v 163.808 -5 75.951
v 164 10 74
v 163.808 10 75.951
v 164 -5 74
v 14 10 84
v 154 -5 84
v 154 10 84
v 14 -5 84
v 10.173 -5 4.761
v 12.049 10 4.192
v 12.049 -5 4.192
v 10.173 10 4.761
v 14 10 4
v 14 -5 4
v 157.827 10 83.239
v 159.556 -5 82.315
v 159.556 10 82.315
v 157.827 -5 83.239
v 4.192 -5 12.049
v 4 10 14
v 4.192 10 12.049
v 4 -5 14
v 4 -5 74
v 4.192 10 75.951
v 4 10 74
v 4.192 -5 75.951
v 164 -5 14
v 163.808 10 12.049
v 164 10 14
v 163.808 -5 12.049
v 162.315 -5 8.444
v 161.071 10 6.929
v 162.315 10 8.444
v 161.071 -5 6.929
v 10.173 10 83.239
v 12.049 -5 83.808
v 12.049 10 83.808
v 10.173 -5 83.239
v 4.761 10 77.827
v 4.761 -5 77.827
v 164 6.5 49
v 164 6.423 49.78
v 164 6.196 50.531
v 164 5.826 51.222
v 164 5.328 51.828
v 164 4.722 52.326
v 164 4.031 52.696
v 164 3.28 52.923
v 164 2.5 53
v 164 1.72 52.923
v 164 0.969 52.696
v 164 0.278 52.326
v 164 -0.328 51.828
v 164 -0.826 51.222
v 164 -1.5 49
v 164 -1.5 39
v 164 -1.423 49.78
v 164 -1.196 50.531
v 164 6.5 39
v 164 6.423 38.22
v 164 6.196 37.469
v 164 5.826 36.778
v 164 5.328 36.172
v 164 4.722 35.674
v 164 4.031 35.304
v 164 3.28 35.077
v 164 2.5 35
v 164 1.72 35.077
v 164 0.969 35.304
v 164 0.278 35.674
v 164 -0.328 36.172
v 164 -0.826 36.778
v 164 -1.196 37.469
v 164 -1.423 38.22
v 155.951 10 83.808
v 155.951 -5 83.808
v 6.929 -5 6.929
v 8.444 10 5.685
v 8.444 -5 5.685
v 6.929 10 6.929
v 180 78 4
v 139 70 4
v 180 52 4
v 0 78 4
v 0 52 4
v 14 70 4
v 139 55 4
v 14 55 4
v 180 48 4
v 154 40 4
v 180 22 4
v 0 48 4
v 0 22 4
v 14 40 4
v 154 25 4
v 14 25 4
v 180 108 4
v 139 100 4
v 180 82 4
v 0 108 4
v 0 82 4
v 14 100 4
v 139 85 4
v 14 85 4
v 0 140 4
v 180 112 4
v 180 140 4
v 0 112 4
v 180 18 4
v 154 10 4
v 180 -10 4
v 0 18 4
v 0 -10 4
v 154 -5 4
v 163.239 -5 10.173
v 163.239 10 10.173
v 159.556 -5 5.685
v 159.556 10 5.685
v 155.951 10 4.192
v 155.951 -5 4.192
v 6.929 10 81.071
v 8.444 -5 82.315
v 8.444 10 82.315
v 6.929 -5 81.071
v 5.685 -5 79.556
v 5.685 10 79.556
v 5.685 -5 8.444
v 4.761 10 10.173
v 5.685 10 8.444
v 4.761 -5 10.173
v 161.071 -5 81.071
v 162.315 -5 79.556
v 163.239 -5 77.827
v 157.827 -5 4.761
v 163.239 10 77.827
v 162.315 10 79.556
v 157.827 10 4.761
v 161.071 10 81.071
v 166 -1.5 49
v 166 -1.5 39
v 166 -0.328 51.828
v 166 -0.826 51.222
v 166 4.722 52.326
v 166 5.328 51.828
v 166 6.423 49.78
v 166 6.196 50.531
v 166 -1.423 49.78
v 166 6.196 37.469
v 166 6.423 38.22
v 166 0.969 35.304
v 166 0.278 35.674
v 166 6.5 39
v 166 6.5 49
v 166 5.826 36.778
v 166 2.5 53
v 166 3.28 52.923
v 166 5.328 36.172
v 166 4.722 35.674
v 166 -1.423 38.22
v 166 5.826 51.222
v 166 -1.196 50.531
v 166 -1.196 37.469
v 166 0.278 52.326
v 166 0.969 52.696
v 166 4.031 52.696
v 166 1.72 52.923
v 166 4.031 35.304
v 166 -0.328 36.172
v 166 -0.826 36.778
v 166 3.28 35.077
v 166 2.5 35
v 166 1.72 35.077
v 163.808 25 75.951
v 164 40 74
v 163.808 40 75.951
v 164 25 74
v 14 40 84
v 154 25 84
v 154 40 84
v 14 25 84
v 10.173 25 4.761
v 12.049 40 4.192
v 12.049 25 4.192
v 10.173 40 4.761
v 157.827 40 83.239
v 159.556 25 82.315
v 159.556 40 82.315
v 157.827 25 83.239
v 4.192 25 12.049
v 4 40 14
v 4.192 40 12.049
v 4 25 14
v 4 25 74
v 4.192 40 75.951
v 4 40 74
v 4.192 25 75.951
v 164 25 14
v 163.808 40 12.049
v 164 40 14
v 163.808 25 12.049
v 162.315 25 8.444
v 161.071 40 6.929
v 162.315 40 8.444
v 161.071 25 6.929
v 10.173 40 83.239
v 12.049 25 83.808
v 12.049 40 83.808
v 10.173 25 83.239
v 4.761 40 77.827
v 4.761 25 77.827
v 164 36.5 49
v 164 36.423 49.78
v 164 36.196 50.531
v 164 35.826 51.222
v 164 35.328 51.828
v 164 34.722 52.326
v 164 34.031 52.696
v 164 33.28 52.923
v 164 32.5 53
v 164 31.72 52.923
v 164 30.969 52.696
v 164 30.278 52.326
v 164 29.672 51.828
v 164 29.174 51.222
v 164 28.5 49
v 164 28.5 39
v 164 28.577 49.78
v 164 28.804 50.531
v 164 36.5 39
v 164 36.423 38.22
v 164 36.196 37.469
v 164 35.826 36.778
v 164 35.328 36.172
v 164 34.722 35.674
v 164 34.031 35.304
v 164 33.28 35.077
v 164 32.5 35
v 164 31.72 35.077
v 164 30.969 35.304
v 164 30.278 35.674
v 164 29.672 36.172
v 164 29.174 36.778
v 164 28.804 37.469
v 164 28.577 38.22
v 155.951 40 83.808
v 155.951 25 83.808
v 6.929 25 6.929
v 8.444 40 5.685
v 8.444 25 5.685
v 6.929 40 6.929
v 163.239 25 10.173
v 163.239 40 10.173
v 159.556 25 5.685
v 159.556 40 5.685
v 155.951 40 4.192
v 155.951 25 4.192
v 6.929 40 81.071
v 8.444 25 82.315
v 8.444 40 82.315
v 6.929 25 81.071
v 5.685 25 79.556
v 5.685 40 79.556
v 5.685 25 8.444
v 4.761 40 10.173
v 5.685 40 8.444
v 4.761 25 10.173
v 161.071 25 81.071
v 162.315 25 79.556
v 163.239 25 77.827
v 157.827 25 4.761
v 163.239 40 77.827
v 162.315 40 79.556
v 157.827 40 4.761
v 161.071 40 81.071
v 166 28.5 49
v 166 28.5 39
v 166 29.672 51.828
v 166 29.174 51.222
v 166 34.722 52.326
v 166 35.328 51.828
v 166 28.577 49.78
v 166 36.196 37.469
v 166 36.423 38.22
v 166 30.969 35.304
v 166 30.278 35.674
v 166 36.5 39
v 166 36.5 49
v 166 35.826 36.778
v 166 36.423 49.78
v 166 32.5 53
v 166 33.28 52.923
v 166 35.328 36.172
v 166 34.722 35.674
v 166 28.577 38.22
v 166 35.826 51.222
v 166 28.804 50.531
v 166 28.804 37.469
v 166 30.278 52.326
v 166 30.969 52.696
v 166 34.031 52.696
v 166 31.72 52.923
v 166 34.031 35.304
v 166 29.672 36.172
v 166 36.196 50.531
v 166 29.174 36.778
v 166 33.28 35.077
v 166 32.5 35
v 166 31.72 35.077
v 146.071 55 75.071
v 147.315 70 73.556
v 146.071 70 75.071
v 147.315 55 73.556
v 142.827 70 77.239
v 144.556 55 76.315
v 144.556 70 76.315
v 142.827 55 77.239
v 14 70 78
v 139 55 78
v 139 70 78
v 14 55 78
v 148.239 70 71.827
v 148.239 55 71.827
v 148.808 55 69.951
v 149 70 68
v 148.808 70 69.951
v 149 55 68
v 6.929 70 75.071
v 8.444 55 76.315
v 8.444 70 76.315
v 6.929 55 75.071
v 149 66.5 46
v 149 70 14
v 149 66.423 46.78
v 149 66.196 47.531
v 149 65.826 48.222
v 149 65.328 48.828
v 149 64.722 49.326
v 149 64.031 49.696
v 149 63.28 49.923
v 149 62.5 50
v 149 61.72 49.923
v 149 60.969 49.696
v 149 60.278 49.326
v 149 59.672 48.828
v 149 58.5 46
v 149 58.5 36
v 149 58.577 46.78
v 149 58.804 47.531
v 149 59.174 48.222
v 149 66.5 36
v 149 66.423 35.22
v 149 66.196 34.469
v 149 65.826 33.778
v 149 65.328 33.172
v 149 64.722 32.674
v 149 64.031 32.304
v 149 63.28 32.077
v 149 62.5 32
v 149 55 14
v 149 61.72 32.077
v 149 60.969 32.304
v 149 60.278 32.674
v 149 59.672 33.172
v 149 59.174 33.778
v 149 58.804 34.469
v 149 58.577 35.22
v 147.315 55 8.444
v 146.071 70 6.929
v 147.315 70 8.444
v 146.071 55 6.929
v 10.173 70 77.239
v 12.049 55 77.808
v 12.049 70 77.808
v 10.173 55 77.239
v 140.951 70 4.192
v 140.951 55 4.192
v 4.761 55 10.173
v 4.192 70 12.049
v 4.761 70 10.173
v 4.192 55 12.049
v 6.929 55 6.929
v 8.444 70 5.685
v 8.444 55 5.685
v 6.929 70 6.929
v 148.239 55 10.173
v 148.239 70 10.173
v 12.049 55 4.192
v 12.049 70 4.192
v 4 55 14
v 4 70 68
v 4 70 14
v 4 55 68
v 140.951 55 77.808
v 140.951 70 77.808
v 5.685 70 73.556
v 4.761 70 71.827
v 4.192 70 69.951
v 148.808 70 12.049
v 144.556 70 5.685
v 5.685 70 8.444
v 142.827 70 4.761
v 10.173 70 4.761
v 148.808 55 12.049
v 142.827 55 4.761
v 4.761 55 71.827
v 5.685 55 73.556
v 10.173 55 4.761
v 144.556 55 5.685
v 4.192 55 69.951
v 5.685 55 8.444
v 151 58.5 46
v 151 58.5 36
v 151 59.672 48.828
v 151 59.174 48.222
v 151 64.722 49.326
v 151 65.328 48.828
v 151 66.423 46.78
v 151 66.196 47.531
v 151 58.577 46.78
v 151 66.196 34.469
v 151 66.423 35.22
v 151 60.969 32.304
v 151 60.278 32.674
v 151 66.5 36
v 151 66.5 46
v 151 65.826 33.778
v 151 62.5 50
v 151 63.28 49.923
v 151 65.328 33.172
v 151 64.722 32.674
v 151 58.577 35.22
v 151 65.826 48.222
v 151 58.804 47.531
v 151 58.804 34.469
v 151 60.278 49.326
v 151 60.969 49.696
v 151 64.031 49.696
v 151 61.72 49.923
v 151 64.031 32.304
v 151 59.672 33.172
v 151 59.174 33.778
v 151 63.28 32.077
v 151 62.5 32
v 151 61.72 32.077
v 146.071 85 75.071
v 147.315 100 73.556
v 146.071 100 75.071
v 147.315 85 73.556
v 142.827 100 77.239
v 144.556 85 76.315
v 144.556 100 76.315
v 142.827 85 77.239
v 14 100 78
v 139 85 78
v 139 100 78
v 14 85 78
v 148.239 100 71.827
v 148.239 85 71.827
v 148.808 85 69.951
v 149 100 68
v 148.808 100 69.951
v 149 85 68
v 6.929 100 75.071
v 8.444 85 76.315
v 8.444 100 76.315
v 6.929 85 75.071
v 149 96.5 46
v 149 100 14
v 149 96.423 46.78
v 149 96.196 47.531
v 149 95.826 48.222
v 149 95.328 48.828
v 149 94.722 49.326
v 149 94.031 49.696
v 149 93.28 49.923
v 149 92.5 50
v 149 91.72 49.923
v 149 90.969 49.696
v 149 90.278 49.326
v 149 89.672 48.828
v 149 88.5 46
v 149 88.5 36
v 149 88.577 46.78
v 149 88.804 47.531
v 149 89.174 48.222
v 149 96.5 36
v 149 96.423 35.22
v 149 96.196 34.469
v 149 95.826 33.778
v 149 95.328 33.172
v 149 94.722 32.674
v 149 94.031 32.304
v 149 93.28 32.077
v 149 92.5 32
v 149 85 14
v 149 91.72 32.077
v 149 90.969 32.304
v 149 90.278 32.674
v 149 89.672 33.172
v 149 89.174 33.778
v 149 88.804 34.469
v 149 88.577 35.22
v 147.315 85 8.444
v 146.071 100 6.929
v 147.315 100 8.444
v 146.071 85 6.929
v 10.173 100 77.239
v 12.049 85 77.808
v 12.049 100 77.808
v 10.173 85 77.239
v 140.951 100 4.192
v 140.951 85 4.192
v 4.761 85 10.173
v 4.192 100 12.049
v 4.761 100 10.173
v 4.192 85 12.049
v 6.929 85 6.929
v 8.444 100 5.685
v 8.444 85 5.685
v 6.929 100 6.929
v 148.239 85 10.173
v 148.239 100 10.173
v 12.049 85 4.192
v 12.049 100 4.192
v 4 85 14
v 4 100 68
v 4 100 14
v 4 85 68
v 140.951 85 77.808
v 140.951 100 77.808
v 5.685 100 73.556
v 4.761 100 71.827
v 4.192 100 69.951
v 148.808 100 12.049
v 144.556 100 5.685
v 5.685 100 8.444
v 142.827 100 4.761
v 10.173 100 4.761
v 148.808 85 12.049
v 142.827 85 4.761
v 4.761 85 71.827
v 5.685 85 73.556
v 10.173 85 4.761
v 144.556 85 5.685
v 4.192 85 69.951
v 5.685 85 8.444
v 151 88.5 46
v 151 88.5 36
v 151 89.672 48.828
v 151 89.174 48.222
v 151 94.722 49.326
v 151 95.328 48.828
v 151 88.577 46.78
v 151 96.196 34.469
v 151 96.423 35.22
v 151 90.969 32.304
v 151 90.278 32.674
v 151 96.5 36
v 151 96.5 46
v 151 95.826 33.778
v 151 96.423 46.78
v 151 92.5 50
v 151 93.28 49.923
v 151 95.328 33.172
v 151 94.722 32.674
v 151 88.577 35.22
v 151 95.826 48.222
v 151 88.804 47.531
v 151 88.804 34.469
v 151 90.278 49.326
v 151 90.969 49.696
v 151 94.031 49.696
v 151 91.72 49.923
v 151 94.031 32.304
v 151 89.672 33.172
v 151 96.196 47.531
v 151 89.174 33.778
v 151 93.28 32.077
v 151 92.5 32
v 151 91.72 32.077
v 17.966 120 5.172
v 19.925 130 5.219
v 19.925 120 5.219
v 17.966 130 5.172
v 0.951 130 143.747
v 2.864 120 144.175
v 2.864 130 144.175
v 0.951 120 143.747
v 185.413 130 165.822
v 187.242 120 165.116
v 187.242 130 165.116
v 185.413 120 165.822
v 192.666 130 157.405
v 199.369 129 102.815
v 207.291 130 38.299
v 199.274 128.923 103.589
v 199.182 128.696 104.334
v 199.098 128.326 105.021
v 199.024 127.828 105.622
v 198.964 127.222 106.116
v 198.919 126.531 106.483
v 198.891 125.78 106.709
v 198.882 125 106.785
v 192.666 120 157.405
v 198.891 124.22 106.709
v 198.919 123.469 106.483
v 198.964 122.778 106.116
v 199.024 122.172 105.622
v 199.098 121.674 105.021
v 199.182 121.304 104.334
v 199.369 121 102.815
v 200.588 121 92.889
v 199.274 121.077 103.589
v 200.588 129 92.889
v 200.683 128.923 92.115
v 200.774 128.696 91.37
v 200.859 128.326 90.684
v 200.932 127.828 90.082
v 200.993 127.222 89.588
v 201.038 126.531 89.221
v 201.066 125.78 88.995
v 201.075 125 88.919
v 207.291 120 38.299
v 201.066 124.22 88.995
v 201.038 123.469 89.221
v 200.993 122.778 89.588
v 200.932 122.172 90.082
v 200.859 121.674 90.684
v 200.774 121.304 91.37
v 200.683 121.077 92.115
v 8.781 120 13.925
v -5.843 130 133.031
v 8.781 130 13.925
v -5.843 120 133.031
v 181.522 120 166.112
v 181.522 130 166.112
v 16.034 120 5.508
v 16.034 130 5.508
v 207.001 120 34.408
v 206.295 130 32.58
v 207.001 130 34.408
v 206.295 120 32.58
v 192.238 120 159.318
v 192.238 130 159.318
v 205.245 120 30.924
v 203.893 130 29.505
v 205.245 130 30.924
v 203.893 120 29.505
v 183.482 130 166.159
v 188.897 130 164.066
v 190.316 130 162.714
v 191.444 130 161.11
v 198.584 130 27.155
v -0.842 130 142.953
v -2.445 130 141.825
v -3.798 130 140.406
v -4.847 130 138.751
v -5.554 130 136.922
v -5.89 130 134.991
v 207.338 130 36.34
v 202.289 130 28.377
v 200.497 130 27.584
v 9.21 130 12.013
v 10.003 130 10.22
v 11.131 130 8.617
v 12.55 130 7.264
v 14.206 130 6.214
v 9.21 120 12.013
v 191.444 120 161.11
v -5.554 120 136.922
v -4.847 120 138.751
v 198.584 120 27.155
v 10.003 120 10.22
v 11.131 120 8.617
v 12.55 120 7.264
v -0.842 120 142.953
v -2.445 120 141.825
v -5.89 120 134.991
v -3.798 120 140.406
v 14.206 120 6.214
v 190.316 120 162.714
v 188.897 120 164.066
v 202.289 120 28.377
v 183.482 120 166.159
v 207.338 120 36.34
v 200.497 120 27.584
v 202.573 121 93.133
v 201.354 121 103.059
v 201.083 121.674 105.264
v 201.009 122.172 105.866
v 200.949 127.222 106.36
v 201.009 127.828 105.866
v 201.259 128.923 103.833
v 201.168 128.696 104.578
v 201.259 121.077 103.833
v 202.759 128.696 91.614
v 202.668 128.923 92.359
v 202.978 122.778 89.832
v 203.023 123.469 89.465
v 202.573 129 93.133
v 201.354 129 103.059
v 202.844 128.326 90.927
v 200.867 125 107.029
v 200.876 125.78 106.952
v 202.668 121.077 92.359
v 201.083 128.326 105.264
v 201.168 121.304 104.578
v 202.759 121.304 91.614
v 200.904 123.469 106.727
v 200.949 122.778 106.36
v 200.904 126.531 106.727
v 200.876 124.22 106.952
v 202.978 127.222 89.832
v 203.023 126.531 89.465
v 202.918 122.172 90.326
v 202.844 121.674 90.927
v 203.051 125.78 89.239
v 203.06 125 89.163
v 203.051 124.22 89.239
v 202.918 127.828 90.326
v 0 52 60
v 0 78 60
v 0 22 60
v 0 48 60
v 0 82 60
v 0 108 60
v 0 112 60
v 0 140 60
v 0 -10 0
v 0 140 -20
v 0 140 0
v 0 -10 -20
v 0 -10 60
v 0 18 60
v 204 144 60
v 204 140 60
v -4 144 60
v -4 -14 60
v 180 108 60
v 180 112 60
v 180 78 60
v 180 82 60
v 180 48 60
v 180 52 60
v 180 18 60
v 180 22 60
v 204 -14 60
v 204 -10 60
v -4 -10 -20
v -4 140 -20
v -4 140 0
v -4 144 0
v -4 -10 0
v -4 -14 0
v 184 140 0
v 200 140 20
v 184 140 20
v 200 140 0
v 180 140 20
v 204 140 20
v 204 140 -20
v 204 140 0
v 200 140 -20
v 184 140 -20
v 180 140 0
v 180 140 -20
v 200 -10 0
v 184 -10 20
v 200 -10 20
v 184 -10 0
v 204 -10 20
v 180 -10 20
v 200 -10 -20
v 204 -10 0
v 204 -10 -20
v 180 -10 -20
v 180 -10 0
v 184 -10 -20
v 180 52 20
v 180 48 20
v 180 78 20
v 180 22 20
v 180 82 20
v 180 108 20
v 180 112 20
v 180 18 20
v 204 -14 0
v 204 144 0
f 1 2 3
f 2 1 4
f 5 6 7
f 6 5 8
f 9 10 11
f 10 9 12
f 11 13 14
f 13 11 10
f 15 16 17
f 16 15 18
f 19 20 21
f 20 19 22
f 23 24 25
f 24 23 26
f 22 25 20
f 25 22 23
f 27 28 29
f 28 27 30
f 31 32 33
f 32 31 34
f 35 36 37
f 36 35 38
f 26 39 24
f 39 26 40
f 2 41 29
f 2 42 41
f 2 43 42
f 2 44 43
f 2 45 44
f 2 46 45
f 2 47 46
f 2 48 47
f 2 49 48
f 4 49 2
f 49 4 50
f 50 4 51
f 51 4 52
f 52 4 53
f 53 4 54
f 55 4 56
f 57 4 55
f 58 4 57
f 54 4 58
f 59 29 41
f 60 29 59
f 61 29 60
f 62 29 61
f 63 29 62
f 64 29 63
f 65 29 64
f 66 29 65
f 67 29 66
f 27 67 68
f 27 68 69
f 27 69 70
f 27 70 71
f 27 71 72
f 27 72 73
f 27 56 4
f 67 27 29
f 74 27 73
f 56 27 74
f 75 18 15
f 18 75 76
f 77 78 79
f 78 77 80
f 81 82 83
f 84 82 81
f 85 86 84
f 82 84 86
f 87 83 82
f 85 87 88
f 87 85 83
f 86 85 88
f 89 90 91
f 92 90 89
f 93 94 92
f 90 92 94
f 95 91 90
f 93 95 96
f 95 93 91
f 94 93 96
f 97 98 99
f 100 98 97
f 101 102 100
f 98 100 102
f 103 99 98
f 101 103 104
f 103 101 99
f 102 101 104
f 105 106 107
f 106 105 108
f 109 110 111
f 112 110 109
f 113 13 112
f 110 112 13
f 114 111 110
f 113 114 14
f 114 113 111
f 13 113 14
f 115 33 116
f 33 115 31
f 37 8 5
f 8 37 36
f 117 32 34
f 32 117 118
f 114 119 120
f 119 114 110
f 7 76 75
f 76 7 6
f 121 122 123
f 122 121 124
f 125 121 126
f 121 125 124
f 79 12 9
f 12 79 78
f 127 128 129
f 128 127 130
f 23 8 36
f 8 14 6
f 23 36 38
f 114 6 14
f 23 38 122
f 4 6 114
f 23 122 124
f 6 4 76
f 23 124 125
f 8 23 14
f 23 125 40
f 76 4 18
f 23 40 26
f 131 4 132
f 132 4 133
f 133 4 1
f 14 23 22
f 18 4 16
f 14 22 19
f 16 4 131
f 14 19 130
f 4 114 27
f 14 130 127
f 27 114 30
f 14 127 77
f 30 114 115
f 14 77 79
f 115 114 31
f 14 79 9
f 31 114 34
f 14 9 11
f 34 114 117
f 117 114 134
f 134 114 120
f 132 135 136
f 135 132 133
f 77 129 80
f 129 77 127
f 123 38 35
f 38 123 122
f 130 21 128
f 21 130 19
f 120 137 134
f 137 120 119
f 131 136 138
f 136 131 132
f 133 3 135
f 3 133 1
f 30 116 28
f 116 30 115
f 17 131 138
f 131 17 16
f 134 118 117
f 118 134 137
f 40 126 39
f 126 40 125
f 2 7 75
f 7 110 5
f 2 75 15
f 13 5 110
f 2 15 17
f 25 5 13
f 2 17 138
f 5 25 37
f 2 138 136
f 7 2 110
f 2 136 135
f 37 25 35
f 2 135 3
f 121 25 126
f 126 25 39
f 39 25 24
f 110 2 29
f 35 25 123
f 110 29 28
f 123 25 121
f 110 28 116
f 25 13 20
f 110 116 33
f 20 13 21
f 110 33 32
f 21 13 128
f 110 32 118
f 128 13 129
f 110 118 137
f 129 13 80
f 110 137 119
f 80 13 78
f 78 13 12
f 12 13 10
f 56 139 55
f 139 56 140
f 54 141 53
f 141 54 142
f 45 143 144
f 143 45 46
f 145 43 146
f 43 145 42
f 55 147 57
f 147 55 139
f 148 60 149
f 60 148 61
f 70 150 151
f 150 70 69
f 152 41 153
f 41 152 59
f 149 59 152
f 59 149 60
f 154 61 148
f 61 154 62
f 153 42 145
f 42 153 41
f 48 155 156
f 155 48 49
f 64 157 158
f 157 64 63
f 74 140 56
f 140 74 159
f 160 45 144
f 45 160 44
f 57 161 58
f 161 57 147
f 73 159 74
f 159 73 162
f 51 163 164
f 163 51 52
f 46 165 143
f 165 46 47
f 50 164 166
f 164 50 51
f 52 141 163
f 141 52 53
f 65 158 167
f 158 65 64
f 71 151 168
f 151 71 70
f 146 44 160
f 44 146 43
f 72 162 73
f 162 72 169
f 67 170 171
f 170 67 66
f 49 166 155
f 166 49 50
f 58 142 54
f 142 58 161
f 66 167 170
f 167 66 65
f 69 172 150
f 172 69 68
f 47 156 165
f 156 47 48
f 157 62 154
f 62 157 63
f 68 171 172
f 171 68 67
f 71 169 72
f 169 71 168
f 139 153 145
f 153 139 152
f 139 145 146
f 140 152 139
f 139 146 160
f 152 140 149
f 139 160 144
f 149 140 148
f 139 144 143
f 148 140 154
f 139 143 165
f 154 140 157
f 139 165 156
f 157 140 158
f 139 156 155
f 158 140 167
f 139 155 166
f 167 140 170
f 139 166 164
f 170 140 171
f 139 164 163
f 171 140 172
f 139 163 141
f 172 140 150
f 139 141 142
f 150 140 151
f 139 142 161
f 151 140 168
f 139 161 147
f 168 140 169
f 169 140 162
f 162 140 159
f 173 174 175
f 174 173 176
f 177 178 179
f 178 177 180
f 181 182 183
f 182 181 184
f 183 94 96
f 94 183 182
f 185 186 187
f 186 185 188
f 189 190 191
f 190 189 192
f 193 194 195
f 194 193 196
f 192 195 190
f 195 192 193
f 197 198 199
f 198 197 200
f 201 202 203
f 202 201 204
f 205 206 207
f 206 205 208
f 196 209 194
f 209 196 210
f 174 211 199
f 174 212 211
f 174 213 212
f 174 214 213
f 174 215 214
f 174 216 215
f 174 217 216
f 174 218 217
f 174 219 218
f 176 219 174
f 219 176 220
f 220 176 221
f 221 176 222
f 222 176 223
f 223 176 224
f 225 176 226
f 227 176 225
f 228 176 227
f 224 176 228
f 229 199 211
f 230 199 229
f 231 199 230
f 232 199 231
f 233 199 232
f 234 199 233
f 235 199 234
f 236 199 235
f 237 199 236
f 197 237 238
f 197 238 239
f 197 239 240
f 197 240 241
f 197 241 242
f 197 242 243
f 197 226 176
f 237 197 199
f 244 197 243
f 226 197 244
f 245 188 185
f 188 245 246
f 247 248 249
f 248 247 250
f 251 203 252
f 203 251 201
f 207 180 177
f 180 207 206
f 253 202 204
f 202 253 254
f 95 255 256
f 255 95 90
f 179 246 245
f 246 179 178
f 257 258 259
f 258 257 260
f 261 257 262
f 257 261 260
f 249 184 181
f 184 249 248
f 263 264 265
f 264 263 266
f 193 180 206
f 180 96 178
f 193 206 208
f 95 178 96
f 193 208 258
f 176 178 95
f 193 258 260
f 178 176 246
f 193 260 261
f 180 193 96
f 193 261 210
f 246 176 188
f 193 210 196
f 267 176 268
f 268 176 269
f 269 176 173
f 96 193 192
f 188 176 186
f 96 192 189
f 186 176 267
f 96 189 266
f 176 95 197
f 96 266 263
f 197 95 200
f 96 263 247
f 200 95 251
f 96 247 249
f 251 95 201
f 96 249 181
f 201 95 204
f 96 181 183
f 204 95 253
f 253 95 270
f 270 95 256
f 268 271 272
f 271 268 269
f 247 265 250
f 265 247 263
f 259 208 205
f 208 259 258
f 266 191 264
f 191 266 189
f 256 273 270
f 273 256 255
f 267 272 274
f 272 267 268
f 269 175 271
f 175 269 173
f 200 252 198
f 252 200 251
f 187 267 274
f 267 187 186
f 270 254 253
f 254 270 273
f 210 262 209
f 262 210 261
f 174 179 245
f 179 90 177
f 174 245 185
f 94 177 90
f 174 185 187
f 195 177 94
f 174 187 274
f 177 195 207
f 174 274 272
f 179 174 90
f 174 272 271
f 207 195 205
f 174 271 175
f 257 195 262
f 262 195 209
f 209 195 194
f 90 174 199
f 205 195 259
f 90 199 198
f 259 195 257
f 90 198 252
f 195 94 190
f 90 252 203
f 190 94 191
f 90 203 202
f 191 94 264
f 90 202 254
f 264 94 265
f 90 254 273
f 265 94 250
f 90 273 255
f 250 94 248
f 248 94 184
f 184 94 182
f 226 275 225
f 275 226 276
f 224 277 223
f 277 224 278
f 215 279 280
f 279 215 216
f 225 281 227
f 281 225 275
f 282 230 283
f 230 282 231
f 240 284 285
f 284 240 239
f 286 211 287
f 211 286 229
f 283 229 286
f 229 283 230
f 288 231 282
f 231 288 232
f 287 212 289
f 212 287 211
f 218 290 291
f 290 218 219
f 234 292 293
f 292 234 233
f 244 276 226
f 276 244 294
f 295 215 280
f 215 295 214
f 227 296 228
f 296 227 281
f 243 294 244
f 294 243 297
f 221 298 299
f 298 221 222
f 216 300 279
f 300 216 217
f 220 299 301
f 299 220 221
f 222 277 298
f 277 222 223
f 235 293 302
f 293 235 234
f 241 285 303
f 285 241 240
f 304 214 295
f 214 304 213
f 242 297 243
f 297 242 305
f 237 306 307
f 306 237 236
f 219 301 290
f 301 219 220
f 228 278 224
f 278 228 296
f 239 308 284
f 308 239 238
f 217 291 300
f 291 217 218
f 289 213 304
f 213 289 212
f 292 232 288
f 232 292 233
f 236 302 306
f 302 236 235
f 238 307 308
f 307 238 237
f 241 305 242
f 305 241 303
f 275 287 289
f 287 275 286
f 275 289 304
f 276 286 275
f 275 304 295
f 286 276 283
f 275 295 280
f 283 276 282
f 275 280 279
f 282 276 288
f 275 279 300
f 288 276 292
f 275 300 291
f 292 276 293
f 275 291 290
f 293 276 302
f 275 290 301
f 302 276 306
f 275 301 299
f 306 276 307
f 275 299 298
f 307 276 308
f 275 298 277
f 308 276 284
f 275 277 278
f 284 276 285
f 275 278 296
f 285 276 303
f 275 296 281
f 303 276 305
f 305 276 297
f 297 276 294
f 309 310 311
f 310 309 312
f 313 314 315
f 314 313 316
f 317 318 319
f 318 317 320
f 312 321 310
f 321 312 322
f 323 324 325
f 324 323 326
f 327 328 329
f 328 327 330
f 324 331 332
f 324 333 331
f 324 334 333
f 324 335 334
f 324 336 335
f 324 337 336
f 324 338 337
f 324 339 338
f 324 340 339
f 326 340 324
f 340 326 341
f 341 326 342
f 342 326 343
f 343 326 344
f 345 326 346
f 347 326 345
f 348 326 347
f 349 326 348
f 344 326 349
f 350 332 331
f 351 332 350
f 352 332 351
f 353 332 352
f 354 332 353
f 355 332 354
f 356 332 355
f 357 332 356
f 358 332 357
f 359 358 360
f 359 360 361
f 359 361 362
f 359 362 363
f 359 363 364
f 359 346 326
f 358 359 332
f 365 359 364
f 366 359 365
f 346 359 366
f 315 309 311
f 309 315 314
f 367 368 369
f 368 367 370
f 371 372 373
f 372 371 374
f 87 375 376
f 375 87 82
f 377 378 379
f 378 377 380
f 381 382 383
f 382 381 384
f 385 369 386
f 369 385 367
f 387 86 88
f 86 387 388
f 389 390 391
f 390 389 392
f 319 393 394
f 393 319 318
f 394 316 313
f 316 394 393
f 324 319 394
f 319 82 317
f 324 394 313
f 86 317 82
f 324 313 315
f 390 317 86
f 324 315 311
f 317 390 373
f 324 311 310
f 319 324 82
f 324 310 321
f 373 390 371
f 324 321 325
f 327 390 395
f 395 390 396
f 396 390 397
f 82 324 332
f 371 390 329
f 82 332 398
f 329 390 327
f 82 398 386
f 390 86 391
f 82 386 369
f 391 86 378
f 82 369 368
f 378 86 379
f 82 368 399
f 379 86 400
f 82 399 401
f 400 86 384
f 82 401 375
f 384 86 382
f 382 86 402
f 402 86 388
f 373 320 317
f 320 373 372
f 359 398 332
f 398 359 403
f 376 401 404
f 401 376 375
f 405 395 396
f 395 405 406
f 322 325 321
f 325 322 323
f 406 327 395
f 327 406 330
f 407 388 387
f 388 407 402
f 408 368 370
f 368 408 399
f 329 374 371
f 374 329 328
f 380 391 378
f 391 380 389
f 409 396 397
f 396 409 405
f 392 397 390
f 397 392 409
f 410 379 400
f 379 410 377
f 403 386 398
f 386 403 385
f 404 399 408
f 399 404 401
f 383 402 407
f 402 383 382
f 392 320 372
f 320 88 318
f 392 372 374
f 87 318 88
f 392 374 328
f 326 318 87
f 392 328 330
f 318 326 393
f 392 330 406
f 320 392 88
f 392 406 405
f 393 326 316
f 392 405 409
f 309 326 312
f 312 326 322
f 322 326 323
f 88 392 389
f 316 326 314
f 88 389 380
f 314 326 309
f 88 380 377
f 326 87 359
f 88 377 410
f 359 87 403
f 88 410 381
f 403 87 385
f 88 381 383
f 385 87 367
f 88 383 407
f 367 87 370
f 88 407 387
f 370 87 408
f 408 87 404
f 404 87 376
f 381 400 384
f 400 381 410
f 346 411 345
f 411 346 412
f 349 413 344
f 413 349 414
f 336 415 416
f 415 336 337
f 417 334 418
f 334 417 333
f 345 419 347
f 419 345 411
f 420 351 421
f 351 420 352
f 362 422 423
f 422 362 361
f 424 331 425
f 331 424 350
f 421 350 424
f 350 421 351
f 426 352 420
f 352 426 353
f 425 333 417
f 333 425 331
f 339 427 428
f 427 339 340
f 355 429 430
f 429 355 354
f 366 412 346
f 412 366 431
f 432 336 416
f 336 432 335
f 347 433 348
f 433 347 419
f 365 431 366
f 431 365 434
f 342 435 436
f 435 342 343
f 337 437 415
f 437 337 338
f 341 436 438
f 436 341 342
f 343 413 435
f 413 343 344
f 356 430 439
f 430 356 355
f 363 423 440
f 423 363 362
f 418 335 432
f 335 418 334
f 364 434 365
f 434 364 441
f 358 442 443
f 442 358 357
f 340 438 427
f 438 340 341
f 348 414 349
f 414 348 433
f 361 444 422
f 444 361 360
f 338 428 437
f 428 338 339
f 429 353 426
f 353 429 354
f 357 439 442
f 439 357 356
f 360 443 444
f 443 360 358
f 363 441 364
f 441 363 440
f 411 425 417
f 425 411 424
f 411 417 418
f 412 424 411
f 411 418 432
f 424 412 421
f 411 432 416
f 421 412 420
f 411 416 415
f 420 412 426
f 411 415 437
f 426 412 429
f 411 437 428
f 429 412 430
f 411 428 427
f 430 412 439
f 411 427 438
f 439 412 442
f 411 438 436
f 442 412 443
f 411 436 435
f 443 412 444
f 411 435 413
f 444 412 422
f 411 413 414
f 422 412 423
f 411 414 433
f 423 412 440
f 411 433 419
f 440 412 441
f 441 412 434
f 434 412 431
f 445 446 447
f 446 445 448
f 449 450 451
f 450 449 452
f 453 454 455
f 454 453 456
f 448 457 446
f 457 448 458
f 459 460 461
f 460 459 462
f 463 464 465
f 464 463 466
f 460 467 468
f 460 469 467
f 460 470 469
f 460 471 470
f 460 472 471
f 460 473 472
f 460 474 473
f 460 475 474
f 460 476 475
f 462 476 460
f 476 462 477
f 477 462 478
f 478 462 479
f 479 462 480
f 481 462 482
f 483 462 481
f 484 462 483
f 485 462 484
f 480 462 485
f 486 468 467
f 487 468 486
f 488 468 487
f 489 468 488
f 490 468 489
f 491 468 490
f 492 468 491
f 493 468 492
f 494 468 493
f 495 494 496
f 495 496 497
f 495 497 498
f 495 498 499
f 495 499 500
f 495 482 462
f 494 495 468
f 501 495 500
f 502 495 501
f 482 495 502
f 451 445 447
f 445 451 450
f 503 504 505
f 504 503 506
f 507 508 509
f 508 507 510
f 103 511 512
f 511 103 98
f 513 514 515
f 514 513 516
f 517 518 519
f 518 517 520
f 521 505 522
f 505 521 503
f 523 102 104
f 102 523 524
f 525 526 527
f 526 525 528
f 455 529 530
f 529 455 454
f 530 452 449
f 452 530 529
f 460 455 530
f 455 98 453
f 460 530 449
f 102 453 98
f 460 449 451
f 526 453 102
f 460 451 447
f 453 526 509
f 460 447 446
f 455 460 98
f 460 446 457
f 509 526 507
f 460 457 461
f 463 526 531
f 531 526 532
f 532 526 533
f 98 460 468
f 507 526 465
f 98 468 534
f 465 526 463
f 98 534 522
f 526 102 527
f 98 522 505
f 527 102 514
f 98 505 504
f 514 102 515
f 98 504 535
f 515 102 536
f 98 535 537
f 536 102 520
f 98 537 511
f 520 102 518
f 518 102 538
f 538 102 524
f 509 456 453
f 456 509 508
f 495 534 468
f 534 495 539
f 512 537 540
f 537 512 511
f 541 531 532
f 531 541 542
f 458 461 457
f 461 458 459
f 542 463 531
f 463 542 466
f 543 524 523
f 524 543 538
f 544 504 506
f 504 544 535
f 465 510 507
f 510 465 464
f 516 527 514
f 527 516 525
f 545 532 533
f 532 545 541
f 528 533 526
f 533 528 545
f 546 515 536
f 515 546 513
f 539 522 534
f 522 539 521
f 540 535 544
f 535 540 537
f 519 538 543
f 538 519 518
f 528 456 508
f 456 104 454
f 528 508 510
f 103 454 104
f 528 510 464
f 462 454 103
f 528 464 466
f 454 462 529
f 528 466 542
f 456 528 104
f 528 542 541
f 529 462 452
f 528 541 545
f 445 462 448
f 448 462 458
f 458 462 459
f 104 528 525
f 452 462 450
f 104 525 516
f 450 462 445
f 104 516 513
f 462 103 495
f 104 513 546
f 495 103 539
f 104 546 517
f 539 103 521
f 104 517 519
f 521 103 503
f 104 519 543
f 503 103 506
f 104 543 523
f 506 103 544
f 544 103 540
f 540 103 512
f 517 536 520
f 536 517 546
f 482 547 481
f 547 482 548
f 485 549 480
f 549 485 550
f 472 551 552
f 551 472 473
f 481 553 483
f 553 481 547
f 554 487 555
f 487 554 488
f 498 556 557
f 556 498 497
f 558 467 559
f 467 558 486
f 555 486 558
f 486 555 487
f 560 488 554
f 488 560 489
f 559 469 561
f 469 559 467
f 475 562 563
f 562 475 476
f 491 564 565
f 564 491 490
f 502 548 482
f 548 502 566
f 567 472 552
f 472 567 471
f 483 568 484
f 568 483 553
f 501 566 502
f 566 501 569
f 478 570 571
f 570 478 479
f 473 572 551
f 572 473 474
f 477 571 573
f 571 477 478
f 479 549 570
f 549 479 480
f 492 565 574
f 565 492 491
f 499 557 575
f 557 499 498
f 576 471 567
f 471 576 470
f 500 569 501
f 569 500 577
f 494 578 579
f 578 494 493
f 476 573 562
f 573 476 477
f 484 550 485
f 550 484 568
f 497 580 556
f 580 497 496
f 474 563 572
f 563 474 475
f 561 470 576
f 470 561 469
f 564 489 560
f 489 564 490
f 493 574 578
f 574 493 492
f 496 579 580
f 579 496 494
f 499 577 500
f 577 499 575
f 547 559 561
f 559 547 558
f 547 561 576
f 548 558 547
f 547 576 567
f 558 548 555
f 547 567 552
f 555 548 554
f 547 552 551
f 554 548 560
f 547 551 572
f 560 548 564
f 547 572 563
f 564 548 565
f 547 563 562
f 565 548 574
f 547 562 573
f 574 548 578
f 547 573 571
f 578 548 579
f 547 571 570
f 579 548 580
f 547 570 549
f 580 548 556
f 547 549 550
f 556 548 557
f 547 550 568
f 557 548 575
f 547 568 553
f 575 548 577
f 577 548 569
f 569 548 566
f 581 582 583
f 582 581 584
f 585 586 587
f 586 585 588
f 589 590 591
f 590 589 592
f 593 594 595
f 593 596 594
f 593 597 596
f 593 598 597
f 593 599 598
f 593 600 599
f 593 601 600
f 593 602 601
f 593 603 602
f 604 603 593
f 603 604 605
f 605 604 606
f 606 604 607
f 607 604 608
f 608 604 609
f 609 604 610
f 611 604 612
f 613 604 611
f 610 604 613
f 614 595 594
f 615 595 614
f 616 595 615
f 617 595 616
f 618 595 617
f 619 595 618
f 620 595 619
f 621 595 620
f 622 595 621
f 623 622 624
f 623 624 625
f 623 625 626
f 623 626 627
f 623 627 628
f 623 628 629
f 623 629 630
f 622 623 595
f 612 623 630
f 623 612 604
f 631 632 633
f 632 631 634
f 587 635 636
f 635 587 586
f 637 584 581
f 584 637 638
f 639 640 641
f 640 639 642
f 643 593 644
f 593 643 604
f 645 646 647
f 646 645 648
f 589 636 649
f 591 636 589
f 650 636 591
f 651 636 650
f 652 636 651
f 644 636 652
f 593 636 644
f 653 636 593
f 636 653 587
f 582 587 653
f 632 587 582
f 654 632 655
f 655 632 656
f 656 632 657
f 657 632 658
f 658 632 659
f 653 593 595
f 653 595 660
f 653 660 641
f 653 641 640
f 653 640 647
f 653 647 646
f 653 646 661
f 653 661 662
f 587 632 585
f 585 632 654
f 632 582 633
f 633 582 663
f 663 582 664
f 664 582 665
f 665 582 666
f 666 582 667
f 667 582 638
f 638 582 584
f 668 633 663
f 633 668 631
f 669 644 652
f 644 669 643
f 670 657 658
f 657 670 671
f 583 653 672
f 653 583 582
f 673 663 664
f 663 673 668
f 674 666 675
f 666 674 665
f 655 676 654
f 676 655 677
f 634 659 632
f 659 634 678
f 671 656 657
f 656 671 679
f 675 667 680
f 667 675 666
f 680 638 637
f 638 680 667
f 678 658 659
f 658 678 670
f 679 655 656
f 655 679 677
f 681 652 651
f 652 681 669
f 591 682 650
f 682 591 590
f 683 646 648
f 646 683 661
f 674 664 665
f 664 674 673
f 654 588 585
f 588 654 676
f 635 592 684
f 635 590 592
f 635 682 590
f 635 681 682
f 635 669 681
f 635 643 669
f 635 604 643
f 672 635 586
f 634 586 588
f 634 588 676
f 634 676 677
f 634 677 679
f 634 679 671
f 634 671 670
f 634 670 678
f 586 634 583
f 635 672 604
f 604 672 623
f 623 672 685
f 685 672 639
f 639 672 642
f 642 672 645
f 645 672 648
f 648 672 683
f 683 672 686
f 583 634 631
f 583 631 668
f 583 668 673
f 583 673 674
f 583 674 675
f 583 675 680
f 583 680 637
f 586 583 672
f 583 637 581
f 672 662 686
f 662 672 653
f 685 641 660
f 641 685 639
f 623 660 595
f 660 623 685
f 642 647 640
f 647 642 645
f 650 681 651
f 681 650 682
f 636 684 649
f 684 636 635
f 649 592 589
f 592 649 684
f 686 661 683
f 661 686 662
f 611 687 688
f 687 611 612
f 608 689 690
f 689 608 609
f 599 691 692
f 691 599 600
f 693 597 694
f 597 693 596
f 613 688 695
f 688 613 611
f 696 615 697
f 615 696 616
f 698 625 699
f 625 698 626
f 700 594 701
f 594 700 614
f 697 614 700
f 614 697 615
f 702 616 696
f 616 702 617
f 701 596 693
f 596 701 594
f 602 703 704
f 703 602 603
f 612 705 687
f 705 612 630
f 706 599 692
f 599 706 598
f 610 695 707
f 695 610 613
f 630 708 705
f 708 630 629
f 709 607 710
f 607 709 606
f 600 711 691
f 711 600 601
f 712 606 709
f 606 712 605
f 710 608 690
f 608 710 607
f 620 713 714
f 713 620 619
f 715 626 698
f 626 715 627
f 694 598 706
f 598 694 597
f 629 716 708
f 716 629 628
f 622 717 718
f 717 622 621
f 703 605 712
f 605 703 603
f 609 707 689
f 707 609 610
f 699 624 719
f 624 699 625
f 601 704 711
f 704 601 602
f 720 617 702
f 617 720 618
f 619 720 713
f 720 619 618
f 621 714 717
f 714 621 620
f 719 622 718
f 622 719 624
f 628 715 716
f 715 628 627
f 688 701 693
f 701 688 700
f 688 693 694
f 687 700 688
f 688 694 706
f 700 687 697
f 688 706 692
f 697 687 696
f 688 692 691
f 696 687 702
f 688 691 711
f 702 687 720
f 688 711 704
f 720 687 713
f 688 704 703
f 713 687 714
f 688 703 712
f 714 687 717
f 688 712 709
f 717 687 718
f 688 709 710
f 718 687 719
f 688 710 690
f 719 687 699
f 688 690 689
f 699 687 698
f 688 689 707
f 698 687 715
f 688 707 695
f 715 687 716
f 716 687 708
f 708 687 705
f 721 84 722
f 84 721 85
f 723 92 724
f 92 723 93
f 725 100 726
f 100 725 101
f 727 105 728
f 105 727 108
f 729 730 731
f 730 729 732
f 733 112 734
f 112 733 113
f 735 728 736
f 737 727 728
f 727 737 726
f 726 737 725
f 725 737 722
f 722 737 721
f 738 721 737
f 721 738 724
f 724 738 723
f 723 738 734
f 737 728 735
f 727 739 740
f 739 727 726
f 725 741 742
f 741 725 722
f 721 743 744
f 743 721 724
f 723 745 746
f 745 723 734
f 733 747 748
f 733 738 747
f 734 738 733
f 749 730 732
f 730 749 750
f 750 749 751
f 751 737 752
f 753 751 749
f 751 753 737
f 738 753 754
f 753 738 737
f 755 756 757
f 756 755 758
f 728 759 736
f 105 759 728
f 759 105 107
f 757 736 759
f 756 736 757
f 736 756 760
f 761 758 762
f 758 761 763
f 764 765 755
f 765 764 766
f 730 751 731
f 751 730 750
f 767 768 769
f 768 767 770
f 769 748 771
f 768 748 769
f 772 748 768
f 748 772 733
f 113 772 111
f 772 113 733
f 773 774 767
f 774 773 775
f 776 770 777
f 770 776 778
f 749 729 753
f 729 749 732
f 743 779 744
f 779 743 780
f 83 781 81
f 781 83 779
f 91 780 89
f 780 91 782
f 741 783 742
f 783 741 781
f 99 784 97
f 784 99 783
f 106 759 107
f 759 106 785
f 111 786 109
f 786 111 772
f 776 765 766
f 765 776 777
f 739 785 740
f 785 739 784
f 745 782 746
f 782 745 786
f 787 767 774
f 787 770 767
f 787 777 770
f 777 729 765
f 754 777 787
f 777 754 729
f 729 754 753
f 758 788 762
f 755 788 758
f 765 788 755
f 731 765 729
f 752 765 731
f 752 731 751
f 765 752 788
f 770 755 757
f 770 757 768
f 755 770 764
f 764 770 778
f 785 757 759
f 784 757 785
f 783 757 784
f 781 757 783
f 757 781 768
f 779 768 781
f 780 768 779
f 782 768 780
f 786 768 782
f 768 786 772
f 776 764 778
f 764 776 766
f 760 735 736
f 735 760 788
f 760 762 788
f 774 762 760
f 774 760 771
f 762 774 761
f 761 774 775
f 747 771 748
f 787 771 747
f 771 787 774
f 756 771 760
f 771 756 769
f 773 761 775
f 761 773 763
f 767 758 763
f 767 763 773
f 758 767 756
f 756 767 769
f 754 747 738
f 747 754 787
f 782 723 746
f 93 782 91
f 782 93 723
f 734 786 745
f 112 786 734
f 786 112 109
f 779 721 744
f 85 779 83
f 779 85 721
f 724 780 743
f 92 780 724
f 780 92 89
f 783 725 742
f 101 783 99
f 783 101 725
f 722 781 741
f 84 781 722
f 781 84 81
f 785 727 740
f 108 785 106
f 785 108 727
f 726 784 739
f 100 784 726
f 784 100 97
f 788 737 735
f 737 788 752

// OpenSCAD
/**
 * Martin Egli
 * 2023-10-22
 */

module phonedummy(lenx = 160, leny = 80, lenz = 12, col = "LightGreen", loc_res = 32) {
    rad1 = 10;
    color(col) {
        hull() {
            translate([rad1, rad1, 0])
            cylinder(r = rad1, h = lenz, $fn = loc_res);
            translate([lenx - rad1, rad1, 0])
            cylinder(r = rad1, h = lenz, $fn = loc_res);
            translate([lenx - rad1, leny - rad1, 0])
            cylinder(r = rad1, h = lenz, $fn = loc_res);
            translate([rad1, leny - rad1, 0])
            cylinder(r = rad1, h = lenz, $fn = loc_res);
        }

        // usb c
        translate([lenx+2, leny/2, lenz/2])
        rotate([0, -90, 0])
        hull() {
            translate([0, -5, 0])
            cylinder(r = 4, h = 4, $fn = loc_res);
            translate([0, +5, 0])
            cylinder(r = 4, h = 4, $fn = loc_res);
        }
    }
}

module chargerstand(show_phones = 1, loc_res = 32) {
    if(show_phones) {
        translate([4, 0, 4]) {
        
            translate([0, 10+0*30, 0])
            rotate([90, 0, 0])
            phonedummy(160, 80, 15, "SteelBlue");

            translate([0, 10+1*30, 0])
            rotate([90, 0, 0])
            phonedummy(160, 80, 15, "LightBlue");

            translate([0, 10+2*30, 0])
            rotate([90, 0, 0])
            phonedummy(145, 74, 15, "LightGray");

            translate([0, 10+3*30, 0])
            rotate([90, 0, 0])
            phonedummy(145, 74, 15, "DarkGray");

            translate([6, 10+4*30, 0])
            rotate([90, -7, 0])
            phonedummy(200, 140, 10, "LightGreen");
        }
    }
    
    // front
    color("LightCyan")
    translate([-4, -10, -20])
    cube([4, 150, 80]);
    
    // bottom
    color("CadetBlue")
    translate([0, -10, 0])
    cube([180, 150, 4]);
    
    // back
    color("LightCoral")
    translate([180, -10, -20])
    cube([4, 150, 40]);
    
    // shaft for cables
    color("LightSalmon")
    translate([180+20, -10, -20])
    cube([4, 150, 40]);
    
    // rigth side
    color("LightGreen")
    translate([-4, -10-4, 0])
    cube([208, 4, 60]);
    
    // separators from right
    color("MediumSeaGreen")
    translate([0, -10+1*30-2, 4])
    cube([180, 4, 60-4]);
    // separator
    color("SeaGreen")
    translate([0, -10+2*30-2, 4])
    cube([180, 4, 60-4]);
    // separator
    color("ForestGreen")
    translate([0, -10+3*30-2, 4])
    cube([180, 4, 60-4]);
    // separator
    color("Green")
    translate([0, -10+4*30-2, 4])
    cube([180, 4, 60-4]);
    
    // left side
    color("LightGreen")
    translate([-4, 20+4*30, 0])
    cube([208, 4, 60]);
}

chargerstand();
